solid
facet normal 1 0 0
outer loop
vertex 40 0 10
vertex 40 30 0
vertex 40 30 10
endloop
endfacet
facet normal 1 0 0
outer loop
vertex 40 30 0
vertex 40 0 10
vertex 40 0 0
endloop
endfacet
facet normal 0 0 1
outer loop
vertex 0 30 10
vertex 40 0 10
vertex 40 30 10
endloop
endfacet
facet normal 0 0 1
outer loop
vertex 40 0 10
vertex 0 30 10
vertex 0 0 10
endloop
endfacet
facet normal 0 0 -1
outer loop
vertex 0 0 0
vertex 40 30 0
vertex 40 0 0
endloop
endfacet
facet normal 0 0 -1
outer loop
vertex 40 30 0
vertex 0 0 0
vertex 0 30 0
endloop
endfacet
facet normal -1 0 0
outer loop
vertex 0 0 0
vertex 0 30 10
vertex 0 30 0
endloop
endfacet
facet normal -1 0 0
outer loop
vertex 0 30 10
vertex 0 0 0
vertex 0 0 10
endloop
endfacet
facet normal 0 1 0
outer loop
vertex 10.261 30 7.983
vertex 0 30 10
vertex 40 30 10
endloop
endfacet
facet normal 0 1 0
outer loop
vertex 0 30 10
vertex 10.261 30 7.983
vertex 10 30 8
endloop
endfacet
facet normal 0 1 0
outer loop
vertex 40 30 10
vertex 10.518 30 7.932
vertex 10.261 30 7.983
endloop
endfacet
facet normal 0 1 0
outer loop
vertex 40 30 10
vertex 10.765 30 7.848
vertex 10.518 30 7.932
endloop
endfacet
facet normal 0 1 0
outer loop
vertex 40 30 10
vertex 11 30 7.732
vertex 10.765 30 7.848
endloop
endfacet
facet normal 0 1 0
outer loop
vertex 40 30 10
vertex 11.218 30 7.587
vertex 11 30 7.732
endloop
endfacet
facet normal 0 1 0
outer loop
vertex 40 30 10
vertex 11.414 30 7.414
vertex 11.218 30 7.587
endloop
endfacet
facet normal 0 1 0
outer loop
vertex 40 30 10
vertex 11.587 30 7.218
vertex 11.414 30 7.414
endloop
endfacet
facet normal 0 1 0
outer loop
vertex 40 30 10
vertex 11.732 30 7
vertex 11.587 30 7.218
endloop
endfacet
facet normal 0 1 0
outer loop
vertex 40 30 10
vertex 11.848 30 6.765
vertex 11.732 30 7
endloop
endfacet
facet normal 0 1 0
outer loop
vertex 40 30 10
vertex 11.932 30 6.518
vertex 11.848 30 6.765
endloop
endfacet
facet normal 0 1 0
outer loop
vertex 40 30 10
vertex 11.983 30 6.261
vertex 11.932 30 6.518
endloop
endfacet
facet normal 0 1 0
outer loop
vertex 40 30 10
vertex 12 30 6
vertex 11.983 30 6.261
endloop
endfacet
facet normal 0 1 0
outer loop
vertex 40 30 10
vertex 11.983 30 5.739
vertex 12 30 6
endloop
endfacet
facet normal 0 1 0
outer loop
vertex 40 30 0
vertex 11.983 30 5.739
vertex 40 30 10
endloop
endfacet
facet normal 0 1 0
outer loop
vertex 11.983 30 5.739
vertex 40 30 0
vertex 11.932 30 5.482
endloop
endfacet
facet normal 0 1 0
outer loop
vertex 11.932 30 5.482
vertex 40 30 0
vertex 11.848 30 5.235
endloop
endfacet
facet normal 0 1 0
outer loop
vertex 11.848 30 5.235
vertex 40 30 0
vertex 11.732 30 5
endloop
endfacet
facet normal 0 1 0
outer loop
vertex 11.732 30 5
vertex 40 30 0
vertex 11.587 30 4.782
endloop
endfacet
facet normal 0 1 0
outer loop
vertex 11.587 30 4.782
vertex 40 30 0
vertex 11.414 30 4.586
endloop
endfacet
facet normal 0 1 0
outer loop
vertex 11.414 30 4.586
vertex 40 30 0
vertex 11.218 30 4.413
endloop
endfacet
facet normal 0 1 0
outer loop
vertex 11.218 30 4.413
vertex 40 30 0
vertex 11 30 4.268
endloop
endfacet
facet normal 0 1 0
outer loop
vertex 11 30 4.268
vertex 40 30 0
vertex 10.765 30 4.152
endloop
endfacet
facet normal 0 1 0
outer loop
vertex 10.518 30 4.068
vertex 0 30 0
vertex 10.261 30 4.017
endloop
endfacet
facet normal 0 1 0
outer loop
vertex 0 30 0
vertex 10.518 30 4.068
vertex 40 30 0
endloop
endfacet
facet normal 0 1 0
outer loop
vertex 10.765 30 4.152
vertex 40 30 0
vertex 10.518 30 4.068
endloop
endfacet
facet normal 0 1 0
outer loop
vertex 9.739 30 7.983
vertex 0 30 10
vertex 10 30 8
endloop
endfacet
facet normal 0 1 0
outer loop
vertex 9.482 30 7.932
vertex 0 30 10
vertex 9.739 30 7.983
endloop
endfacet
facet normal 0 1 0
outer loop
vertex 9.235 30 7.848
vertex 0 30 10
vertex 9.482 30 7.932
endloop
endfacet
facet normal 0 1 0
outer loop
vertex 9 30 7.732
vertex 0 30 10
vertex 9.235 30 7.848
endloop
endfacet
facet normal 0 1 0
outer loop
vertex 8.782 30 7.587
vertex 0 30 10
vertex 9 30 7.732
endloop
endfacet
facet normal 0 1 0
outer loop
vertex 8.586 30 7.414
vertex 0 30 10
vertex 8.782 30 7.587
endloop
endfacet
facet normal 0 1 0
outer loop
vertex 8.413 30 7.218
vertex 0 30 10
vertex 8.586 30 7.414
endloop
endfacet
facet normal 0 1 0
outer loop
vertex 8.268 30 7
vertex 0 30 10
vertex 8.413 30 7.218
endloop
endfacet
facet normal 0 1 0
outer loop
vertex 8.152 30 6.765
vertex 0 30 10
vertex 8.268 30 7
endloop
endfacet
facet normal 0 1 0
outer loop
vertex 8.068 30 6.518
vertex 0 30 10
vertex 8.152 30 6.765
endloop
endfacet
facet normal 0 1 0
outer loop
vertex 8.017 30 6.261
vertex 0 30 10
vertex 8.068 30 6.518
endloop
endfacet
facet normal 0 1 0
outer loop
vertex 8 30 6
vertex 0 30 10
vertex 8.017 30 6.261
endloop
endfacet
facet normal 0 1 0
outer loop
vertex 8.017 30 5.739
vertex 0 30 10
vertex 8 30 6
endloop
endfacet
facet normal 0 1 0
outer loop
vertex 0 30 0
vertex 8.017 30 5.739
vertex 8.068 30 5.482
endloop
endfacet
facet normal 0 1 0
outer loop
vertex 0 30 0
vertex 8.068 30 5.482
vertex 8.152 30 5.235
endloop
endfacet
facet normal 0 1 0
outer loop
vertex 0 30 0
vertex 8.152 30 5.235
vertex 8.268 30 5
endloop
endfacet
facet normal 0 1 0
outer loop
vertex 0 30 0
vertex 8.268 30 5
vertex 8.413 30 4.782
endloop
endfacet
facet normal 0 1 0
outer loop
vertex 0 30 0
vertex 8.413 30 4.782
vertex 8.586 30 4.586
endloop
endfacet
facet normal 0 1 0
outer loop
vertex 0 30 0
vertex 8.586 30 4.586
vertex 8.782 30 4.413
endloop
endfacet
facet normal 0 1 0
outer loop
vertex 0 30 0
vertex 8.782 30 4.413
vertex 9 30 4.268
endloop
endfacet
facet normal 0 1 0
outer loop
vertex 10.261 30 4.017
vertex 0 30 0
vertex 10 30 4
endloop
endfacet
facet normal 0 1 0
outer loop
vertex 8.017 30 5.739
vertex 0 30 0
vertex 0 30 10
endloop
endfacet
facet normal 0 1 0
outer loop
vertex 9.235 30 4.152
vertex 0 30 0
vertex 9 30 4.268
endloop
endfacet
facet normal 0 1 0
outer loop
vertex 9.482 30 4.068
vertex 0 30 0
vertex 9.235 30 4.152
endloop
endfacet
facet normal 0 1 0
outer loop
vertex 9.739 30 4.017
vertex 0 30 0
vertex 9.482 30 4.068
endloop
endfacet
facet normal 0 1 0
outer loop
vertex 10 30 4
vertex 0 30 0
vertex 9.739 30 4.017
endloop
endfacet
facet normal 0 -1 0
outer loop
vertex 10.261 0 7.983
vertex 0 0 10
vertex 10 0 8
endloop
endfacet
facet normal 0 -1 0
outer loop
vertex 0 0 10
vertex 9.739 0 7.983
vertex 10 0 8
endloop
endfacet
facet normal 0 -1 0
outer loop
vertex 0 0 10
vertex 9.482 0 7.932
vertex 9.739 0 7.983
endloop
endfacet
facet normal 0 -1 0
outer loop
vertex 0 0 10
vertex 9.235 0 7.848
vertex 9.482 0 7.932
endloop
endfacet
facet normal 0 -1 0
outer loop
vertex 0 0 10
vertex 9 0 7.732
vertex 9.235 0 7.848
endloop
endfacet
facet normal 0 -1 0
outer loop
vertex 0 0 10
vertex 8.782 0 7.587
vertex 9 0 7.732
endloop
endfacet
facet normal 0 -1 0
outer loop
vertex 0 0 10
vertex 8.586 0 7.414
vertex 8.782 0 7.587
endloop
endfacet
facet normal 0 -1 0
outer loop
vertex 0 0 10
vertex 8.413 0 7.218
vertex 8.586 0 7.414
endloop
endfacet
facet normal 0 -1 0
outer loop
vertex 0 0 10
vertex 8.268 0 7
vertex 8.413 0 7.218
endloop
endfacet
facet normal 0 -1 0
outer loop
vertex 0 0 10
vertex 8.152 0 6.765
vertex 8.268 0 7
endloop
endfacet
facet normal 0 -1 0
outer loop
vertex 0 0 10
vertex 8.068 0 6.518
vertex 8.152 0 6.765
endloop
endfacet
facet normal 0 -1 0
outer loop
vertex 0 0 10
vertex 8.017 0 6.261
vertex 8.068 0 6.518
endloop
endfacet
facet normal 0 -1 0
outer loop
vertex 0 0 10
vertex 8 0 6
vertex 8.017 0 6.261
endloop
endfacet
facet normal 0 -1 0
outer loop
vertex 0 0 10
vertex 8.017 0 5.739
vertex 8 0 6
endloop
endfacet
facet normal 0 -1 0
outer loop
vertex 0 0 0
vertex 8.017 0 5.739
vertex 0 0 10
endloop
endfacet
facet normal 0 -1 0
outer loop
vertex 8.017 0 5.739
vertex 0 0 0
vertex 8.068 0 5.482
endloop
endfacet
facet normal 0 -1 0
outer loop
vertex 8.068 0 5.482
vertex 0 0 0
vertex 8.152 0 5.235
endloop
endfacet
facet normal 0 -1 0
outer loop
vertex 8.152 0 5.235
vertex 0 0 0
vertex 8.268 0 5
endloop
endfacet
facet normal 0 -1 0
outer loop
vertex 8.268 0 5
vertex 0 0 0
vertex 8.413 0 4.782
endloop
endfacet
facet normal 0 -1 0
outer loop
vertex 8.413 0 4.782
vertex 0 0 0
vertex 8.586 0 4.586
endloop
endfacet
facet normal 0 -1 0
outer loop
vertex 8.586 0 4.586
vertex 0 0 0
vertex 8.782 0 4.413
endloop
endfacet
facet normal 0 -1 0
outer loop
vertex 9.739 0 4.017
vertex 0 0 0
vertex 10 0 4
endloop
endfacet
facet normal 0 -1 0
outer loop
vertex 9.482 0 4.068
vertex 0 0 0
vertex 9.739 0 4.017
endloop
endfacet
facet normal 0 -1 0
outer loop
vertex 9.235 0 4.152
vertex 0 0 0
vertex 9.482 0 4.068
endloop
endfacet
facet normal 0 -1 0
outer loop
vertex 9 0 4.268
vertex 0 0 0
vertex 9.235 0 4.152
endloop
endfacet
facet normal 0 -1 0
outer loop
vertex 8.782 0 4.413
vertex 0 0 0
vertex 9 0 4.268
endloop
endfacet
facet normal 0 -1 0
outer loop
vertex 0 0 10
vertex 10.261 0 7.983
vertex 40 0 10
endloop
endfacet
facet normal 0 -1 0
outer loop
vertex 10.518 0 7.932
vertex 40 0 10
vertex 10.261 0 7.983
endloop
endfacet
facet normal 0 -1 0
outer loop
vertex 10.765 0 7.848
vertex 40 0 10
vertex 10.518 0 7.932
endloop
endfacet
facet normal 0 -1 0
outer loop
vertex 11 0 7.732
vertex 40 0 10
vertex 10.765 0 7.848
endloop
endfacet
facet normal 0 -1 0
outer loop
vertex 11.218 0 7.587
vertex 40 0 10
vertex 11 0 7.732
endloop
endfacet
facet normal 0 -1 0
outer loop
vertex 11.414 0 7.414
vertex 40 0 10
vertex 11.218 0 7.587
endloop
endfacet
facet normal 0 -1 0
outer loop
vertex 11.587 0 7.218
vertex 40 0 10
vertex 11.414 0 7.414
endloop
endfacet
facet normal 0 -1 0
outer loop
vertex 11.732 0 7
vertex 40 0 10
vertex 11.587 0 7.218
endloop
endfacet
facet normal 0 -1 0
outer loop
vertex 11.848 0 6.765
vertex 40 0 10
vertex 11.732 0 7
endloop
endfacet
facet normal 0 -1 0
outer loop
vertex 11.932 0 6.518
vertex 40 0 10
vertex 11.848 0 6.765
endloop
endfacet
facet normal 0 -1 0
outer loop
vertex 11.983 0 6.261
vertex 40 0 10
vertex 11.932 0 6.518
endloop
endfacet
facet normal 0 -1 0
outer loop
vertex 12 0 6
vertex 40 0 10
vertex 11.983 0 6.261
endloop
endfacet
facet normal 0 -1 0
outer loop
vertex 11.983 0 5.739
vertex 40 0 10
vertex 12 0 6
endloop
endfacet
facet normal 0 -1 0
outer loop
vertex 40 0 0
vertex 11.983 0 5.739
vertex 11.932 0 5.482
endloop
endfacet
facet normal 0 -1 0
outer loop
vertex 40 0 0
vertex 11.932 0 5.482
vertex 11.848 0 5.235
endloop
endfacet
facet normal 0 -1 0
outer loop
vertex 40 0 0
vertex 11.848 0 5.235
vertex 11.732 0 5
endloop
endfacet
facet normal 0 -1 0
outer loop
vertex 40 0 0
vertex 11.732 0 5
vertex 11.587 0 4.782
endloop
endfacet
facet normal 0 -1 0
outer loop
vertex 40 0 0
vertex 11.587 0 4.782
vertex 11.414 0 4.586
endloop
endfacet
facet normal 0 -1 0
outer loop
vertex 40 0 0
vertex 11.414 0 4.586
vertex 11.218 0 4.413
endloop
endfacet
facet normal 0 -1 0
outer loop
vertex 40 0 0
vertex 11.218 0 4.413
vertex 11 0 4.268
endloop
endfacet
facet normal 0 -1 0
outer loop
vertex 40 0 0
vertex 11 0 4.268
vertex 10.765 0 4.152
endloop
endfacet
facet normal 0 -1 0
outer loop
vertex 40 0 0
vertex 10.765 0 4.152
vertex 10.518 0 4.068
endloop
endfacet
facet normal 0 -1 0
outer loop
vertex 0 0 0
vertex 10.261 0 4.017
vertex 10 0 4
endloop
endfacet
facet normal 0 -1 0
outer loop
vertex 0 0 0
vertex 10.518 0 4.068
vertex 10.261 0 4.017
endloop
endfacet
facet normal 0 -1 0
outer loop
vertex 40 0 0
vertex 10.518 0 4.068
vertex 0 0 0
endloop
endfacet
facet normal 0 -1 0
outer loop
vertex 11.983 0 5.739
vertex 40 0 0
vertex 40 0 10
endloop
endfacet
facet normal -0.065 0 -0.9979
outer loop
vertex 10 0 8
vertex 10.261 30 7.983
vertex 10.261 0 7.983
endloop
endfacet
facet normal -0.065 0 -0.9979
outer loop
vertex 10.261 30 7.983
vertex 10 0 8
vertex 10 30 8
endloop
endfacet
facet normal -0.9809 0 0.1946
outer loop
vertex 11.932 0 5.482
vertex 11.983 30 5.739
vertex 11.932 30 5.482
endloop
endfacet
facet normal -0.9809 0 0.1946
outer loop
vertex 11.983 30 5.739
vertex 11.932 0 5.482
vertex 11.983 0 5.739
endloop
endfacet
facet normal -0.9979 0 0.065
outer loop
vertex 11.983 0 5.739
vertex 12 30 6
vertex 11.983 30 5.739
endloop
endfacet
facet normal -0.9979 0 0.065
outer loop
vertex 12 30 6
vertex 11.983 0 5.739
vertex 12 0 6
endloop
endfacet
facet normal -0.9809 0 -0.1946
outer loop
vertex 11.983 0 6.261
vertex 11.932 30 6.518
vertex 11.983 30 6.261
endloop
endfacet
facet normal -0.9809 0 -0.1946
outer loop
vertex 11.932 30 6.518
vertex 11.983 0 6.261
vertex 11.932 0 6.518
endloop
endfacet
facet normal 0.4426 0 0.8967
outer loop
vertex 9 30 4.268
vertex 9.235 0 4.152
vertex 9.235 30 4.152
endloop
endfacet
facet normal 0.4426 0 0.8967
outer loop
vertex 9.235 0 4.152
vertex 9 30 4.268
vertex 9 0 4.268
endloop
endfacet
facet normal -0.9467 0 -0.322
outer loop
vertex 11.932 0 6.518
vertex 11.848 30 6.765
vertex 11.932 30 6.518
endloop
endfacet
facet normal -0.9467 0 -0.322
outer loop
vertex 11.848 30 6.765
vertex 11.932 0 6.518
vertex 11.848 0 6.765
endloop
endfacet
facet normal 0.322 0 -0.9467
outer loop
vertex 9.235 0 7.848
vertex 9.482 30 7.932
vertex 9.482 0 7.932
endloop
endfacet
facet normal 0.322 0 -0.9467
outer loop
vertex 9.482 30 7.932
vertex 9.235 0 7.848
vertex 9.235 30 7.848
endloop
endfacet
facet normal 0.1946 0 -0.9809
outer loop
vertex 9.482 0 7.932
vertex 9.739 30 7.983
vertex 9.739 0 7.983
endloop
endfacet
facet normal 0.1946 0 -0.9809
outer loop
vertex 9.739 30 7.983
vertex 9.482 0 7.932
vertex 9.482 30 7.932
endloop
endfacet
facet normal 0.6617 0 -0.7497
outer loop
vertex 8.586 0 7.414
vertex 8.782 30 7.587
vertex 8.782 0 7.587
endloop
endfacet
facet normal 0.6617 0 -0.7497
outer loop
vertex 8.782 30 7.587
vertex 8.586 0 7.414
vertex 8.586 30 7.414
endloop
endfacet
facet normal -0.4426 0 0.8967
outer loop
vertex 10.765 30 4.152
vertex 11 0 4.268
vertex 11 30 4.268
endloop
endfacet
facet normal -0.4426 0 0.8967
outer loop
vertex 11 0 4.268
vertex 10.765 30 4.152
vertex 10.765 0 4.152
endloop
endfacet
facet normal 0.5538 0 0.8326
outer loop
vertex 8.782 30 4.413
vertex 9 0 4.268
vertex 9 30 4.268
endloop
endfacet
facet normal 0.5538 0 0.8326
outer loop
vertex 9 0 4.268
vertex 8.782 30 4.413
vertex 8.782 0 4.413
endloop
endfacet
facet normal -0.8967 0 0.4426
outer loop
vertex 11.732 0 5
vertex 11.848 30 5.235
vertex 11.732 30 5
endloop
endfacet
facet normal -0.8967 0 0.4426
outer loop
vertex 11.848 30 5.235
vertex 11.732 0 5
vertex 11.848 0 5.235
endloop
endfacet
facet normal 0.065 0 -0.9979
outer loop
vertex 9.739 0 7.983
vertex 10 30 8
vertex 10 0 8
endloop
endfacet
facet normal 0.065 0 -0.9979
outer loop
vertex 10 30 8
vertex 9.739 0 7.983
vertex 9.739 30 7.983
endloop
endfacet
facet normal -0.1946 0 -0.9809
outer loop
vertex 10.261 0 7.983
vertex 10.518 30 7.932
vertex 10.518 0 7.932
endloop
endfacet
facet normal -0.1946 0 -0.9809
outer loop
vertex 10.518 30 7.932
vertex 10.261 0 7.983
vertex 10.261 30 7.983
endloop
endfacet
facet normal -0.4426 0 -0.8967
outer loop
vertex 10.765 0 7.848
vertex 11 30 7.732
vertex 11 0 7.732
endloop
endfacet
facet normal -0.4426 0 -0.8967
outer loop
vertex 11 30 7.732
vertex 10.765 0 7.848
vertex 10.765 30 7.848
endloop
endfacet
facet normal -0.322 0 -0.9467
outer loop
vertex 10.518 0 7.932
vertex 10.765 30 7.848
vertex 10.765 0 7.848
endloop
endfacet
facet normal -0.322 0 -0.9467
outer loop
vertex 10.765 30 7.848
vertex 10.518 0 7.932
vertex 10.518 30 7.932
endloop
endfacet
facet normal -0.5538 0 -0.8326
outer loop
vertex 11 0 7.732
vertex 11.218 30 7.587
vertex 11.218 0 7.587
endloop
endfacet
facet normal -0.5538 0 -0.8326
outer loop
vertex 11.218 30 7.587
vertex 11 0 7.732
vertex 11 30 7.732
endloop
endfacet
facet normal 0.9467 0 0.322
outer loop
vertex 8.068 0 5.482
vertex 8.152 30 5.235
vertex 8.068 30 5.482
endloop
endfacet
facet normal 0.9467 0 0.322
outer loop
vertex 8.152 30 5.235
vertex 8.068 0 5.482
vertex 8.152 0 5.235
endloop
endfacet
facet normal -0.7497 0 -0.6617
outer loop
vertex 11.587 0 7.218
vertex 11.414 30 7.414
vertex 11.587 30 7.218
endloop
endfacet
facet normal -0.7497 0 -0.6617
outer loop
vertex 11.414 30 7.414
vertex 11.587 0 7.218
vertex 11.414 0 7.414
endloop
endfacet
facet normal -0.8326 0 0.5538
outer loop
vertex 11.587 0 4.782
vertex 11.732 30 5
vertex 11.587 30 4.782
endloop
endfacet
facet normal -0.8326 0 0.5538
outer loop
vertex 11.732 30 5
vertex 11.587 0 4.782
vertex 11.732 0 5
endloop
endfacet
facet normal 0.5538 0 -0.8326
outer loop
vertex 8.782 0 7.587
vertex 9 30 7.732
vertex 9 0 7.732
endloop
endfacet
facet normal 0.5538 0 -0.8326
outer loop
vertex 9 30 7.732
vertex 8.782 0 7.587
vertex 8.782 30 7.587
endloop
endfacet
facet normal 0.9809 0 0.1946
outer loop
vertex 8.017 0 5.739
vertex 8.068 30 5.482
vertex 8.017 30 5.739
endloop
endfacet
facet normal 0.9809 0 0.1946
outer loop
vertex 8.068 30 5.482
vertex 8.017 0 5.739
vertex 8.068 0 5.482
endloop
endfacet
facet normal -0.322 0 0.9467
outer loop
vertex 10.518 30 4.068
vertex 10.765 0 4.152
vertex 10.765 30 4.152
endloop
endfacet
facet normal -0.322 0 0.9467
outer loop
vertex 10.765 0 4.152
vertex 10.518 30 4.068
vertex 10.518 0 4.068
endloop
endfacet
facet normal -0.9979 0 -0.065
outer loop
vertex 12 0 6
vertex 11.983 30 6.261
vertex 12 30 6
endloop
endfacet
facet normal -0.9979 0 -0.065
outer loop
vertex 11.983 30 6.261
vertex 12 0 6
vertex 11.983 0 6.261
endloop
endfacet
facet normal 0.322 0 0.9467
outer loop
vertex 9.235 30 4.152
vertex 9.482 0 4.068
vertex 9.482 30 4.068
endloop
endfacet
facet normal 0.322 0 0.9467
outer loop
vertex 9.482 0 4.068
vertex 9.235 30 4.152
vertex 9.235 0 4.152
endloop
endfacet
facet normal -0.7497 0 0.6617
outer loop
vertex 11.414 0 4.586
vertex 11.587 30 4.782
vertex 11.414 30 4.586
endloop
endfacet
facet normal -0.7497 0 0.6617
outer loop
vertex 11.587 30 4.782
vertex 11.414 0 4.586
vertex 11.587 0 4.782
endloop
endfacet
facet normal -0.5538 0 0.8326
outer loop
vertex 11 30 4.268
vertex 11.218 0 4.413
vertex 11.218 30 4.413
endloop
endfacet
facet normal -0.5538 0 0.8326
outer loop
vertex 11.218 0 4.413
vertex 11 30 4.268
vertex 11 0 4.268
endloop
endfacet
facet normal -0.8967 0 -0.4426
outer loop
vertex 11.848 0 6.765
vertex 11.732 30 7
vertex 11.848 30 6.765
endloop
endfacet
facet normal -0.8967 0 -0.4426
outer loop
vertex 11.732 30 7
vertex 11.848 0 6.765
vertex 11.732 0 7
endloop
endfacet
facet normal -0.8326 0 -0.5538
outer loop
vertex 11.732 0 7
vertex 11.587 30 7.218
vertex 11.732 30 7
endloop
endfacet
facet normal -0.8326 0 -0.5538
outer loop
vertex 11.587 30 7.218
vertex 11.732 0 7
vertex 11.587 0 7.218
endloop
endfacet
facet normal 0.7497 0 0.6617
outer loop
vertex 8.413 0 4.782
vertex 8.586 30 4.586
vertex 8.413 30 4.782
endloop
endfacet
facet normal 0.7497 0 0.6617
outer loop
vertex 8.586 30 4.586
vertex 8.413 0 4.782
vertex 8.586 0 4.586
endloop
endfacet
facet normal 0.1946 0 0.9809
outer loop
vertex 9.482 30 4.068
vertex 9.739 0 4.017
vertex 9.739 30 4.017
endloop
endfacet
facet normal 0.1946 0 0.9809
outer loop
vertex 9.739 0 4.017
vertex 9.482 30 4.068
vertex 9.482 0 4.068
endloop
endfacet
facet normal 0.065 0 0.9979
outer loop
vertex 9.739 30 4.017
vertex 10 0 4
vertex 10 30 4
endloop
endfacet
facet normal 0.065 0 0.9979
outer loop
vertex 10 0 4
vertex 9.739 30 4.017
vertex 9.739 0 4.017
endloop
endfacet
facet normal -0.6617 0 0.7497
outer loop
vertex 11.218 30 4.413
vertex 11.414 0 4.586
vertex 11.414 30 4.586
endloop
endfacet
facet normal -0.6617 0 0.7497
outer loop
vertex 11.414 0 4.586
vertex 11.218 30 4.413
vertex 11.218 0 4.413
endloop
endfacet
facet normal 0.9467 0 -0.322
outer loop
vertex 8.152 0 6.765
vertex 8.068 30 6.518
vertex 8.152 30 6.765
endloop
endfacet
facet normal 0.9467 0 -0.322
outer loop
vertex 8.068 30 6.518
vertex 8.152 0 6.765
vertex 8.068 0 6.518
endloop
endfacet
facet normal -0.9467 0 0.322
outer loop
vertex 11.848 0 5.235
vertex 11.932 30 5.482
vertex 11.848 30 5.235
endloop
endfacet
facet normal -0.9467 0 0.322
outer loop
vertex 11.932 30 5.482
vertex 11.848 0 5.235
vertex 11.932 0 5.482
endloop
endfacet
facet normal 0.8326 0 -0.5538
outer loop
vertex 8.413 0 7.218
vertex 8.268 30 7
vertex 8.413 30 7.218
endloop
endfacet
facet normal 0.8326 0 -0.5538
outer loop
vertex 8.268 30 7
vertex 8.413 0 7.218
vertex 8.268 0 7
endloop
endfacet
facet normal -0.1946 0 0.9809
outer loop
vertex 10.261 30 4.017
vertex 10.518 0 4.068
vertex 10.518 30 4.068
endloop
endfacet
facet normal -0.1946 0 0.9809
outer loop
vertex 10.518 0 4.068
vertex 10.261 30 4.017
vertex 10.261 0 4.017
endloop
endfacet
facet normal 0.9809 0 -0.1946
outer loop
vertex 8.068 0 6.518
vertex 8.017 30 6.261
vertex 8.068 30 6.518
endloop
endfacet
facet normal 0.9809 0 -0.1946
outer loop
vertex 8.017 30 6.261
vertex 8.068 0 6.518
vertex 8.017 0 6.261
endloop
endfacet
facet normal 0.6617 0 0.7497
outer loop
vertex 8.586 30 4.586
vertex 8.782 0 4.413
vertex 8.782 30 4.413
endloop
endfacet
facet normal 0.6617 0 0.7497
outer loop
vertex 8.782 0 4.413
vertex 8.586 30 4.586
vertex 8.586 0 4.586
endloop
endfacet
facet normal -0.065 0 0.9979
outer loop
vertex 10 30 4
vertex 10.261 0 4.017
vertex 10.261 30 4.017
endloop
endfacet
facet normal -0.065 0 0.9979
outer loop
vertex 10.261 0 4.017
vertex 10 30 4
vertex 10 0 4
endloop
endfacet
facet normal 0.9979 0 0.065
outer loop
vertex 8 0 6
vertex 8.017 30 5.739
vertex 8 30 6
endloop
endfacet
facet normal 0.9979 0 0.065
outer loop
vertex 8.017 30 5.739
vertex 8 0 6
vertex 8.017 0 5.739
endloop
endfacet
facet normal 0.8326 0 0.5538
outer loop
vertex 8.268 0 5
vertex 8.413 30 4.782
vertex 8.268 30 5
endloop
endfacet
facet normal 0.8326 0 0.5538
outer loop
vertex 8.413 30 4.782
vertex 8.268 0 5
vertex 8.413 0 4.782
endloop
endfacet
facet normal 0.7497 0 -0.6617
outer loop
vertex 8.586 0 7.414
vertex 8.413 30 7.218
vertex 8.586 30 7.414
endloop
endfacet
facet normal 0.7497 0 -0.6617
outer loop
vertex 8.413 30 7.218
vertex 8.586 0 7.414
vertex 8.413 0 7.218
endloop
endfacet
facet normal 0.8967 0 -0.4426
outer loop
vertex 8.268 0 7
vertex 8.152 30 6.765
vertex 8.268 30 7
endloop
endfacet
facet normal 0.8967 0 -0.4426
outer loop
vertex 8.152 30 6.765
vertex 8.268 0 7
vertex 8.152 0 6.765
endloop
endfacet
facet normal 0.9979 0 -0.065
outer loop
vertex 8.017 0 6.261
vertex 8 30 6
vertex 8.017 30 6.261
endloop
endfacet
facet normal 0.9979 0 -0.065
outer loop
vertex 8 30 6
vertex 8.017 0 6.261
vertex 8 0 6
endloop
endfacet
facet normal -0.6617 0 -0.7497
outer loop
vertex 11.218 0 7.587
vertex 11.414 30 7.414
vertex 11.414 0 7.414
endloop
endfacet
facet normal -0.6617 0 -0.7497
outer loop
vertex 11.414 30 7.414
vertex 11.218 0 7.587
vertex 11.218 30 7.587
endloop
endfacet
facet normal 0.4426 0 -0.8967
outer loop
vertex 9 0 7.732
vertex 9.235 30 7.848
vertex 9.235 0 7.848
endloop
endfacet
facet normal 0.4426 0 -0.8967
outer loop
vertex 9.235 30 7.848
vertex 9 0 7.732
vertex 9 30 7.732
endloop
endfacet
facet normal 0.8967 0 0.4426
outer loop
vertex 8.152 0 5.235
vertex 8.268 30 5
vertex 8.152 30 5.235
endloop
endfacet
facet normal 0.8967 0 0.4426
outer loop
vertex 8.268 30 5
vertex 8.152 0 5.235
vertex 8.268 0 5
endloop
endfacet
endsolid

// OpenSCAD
// units=mm — generated by scad_emitter.py
// part=unnamed
$fn = 48;

difference() { cube([40, 30, 10]); translate([10, -0.5, 6]) rotate([-90, 0, 0]) cylinder(h=31, r=2, $fn=$fn); }
